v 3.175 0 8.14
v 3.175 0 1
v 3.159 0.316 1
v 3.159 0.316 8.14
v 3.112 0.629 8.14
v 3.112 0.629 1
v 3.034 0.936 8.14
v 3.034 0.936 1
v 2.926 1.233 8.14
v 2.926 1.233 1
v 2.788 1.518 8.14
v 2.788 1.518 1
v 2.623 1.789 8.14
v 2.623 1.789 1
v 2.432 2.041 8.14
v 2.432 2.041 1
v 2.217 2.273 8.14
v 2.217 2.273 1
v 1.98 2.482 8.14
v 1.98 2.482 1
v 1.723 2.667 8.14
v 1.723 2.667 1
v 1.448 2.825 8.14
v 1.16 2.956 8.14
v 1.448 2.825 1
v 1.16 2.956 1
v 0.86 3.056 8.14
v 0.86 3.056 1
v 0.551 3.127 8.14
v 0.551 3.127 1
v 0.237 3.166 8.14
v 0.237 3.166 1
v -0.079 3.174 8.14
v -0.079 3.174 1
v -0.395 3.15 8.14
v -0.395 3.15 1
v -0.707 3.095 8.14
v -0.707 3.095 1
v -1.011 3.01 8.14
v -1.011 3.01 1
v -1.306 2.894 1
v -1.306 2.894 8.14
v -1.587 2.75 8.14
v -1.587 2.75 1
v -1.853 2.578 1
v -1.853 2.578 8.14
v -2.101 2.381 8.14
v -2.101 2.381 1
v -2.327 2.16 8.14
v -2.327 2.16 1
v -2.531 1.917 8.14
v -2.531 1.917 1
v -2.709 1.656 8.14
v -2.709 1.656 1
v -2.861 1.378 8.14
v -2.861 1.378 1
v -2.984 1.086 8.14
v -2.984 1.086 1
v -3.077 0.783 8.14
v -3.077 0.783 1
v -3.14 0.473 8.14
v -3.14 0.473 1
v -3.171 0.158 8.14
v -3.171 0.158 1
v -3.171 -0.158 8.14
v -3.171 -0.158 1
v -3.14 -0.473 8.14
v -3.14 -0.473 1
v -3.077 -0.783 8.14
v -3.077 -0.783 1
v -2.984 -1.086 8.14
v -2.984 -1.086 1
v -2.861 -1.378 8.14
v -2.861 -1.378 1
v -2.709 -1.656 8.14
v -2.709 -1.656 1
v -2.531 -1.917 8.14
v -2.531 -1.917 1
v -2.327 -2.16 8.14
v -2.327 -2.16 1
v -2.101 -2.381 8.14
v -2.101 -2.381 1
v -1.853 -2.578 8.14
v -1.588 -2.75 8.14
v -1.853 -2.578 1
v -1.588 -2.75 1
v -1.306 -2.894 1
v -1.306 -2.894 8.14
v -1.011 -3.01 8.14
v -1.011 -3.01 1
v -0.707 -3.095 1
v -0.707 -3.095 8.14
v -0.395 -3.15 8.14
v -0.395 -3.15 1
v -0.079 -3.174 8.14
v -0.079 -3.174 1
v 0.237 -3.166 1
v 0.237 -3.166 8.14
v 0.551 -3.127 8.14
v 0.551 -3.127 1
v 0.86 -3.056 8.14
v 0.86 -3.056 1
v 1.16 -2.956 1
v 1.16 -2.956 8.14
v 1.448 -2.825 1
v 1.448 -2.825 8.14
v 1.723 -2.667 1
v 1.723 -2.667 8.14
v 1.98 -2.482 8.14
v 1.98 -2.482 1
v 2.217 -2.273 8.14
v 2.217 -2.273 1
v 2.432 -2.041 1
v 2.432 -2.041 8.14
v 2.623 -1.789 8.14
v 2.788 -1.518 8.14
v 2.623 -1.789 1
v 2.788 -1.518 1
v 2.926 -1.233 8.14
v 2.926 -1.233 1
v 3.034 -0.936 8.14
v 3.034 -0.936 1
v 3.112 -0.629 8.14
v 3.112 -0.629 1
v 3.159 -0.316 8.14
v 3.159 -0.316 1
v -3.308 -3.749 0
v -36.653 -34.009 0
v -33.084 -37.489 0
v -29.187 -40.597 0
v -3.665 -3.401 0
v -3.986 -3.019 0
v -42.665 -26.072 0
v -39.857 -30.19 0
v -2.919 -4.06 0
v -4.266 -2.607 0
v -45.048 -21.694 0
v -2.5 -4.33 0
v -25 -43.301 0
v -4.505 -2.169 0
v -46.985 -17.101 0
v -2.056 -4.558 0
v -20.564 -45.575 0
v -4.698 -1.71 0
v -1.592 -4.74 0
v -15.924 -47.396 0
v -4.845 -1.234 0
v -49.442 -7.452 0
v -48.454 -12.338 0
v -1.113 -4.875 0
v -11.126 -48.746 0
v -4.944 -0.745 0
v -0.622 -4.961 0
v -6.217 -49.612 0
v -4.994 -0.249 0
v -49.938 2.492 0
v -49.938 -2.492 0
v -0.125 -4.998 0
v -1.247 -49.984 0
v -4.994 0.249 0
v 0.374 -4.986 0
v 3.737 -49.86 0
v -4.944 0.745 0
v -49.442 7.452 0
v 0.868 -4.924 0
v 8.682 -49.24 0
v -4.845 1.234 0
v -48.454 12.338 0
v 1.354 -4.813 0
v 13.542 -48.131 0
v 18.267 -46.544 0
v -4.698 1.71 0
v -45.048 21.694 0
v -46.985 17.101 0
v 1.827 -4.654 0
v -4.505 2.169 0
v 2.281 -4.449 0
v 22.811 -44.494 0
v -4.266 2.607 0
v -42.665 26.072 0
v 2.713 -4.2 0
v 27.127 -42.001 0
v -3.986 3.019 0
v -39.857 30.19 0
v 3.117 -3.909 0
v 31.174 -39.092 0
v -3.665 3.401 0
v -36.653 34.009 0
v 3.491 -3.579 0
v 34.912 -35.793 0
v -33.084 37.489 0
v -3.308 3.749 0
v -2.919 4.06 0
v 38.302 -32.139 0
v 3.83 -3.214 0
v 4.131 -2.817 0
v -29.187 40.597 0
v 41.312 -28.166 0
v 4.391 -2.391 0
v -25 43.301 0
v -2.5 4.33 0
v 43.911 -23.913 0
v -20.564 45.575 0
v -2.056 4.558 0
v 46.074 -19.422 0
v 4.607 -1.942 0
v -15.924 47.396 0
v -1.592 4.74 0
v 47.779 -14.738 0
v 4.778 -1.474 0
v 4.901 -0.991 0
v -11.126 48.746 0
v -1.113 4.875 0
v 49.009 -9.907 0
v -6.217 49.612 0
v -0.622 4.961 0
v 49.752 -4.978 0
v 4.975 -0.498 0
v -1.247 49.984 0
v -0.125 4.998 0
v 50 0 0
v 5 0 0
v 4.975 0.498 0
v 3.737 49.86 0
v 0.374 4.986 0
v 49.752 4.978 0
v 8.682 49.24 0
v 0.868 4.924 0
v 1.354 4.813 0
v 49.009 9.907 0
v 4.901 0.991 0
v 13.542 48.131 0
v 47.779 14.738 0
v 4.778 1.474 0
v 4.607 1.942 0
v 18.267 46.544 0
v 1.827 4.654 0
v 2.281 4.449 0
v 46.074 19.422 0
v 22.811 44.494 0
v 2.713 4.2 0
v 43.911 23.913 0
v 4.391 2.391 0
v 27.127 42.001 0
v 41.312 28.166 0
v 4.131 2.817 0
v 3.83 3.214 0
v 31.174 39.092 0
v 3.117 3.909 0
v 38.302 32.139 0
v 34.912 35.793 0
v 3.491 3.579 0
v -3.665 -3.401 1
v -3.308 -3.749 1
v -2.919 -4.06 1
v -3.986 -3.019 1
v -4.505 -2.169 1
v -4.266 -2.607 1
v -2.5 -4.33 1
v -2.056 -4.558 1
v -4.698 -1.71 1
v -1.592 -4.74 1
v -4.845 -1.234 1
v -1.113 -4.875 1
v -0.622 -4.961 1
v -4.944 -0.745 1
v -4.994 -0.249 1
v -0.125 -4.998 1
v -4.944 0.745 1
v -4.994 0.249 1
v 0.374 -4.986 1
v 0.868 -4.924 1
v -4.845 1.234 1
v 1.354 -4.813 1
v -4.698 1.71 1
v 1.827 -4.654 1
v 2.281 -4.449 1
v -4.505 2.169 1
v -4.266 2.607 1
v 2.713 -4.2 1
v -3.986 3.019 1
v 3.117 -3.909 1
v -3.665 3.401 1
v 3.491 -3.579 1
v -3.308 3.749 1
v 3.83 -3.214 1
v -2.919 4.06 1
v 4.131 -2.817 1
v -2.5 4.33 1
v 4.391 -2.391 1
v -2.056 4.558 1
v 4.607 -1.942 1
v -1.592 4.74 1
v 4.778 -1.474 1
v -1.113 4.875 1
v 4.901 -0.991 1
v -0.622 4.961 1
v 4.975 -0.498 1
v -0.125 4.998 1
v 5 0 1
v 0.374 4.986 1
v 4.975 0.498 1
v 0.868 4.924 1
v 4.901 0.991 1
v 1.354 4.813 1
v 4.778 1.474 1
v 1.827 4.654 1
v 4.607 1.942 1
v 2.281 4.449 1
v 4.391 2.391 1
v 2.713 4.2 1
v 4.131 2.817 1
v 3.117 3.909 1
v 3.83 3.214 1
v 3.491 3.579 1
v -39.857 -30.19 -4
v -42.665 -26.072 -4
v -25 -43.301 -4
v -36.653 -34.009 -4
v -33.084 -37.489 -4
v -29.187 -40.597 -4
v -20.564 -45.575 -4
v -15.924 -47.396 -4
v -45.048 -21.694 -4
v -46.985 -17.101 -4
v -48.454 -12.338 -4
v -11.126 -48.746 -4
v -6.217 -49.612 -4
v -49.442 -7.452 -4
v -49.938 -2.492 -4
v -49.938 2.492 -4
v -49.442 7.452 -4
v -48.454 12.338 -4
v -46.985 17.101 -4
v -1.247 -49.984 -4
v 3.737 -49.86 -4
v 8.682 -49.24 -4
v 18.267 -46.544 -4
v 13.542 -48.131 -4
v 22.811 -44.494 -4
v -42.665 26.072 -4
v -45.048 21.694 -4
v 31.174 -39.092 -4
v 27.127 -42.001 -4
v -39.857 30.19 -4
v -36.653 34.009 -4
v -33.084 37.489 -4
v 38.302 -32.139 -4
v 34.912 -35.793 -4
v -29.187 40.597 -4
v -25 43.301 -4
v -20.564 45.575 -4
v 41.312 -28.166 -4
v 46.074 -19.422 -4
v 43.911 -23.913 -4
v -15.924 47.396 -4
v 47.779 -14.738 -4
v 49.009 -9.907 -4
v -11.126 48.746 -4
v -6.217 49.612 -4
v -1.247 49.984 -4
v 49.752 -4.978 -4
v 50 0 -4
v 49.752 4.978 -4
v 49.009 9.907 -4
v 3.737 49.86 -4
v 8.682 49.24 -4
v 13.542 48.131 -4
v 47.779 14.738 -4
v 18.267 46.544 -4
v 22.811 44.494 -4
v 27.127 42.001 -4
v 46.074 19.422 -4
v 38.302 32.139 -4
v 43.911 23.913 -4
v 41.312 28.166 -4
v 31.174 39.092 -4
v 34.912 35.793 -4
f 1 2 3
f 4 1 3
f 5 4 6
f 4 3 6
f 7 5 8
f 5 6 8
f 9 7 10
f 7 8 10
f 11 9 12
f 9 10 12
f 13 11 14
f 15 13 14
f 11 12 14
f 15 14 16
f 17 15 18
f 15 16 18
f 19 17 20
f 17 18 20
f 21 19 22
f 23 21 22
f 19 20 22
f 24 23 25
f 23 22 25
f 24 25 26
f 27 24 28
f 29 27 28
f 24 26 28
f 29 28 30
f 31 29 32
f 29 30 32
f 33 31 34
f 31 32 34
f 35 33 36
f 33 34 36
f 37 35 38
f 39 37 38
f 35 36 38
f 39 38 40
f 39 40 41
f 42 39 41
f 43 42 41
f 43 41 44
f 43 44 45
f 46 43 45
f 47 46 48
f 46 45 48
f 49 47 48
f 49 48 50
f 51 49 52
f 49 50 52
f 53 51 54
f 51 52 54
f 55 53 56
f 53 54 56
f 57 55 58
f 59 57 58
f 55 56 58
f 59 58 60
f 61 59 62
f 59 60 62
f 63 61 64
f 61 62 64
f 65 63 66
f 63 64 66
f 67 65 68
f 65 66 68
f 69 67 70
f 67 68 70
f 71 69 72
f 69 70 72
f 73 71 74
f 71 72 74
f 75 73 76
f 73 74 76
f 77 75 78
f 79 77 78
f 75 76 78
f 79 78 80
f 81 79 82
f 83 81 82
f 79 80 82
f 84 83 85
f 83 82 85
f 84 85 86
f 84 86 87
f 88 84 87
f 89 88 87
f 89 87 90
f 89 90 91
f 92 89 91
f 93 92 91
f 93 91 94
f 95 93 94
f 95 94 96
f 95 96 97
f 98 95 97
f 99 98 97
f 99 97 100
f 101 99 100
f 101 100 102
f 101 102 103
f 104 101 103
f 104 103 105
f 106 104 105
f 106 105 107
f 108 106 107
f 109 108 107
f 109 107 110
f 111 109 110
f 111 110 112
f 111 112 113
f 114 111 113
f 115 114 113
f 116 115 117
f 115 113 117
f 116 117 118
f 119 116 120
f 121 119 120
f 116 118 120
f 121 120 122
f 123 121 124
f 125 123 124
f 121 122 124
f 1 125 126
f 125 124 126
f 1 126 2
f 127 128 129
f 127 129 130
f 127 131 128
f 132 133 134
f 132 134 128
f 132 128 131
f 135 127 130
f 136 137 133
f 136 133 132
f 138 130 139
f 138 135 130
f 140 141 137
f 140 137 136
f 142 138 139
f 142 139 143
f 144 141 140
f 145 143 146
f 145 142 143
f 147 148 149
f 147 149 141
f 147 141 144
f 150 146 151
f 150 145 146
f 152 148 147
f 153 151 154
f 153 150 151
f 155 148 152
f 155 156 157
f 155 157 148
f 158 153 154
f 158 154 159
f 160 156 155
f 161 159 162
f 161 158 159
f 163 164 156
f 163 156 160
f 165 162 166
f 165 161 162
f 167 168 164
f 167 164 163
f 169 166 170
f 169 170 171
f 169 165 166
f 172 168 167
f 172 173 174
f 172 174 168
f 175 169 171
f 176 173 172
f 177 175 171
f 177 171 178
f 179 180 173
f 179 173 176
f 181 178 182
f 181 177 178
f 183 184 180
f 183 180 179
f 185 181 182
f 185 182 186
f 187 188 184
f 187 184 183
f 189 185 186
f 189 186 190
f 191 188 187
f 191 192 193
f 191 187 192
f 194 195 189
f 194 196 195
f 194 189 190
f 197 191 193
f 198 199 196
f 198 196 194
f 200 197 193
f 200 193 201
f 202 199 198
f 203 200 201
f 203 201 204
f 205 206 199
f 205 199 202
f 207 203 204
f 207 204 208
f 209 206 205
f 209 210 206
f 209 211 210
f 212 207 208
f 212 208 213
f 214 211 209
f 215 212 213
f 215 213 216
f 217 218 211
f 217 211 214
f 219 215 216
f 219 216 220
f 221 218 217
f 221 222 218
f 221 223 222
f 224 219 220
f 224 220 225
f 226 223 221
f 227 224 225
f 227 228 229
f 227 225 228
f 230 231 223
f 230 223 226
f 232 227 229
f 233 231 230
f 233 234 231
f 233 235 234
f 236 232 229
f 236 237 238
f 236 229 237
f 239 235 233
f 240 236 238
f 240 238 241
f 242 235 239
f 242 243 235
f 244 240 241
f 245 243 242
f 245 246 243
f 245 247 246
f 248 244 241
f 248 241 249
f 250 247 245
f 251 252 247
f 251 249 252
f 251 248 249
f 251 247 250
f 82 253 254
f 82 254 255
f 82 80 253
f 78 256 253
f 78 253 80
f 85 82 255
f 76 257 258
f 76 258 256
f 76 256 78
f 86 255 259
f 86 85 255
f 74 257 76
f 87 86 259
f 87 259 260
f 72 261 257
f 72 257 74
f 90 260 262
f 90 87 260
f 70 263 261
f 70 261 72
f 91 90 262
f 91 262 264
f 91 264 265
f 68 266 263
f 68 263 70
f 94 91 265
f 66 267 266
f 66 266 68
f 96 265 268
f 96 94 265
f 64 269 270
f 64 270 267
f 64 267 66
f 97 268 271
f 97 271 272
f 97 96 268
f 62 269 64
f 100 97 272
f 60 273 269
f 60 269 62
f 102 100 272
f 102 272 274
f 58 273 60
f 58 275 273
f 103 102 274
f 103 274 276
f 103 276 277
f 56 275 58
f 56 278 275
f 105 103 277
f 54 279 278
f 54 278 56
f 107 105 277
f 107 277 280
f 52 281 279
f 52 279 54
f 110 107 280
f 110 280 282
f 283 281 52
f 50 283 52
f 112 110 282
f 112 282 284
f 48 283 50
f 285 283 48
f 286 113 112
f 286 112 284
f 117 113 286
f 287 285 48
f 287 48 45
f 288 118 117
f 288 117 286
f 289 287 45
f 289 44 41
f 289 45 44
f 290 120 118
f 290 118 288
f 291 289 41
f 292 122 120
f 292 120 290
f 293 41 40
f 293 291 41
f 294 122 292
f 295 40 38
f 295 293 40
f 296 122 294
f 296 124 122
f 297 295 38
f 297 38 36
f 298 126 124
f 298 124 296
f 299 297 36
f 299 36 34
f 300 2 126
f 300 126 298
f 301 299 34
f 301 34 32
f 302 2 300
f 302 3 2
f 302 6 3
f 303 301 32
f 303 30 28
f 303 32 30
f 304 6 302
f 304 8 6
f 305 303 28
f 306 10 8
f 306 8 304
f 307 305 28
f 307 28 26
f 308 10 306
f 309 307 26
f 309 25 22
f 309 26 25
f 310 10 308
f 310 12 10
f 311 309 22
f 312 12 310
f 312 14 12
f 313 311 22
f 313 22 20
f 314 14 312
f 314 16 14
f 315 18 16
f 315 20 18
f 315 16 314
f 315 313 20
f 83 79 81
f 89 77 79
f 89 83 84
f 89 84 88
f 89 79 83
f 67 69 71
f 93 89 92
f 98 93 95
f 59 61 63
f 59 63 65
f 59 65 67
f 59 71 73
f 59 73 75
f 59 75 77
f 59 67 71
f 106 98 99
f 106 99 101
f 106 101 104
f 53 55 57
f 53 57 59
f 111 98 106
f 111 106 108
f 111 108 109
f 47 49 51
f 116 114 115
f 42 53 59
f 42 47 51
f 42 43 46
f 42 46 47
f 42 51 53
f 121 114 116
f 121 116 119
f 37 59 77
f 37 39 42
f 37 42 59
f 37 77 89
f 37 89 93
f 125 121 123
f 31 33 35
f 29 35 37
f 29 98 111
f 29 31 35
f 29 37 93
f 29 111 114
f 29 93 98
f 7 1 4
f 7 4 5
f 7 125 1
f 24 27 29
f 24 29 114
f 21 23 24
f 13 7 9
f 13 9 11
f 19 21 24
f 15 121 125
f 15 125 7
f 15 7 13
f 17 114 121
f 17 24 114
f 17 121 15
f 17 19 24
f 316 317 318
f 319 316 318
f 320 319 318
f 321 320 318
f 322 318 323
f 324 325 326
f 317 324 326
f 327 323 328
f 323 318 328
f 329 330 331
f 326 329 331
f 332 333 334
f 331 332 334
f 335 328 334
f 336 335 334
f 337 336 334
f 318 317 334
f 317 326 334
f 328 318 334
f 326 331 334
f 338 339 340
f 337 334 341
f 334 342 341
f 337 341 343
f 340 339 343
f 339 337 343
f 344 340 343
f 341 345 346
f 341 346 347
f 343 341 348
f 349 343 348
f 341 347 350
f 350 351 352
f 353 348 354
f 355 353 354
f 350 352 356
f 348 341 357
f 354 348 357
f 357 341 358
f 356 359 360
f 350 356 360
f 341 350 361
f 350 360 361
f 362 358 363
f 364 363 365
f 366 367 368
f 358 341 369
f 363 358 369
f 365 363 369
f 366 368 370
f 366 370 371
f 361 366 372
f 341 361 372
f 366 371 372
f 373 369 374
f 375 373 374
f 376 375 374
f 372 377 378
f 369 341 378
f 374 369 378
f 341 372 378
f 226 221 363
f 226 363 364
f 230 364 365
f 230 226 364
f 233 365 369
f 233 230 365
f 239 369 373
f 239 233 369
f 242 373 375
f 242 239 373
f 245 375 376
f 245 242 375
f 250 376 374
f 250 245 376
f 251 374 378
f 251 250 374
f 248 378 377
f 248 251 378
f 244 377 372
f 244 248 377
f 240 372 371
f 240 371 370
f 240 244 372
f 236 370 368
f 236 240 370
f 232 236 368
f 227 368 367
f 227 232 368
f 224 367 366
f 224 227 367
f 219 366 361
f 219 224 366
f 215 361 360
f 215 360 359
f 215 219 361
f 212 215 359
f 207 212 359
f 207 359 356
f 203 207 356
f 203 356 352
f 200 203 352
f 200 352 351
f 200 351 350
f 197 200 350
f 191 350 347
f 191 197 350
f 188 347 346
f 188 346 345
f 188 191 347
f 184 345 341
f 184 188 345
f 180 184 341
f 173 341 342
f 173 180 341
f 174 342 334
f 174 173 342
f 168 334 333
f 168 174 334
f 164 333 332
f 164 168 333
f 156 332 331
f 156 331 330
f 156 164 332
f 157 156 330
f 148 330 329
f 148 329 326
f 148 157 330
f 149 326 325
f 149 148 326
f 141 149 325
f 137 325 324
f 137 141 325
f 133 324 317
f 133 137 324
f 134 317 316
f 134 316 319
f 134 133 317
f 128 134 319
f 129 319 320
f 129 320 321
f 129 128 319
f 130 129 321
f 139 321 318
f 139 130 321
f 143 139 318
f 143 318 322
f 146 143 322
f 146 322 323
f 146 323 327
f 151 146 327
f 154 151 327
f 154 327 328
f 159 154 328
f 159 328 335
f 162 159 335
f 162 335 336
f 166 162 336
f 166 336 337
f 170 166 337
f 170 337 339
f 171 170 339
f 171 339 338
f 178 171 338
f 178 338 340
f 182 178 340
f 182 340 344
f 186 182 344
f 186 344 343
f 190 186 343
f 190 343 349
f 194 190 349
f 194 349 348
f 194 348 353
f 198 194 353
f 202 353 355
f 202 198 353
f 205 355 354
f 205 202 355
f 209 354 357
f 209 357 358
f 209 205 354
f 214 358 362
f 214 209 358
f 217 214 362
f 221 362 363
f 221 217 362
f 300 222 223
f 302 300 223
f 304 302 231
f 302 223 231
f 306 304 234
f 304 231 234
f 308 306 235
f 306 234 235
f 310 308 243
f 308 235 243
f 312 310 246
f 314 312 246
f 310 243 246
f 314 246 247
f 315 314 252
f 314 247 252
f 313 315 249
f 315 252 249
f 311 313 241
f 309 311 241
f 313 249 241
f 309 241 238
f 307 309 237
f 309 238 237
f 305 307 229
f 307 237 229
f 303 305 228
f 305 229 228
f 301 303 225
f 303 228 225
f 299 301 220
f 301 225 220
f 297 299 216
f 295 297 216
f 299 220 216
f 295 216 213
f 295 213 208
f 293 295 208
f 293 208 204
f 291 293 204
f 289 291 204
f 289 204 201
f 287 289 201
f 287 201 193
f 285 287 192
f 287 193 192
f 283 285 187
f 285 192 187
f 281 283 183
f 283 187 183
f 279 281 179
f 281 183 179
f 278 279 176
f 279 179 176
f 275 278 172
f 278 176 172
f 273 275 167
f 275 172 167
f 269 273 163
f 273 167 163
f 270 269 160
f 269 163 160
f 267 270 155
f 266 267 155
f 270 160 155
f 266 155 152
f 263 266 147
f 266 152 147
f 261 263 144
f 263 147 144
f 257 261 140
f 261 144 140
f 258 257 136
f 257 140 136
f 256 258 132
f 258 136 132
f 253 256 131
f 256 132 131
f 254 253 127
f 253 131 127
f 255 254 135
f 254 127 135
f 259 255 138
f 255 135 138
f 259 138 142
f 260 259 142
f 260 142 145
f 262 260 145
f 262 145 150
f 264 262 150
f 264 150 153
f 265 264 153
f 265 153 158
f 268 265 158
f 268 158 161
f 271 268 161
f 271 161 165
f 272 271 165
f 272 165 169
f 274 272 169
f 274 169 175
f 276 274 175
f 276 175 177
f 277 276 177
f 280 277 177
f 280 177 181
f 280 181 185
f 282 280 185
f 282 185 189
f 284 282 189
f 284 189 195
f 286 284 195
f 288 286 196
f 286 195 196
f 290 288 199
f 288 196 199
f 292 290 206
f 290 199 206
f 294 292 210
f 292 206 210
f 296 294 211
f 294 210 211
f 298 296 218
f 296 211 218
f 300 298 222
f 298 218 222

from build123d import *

# Parameters (mm, degrees)
F0_R       = 5
F0_R_2     = 3.175
F1_DEPTH   = 1
F2_R       = 3.175
F3_DEPTH   = 7.14
F0_R_3     = 50
F1_FACE1_R = 5
F4_DEPTH   = 4


with BuildPart() as f1:
    # F0 (on Top) → F1 (new body)
    with BuildSketch(Plane.XY):
        Circle(F0_R)
        Circle(F0_R_2, mode=Mode.SUBTRACT)
        Circle(F0_R_2)
    extrude(amount=F1_DEPTH)

    # F2 (on face) → F3 (join)
    with BuildSketch(Plane.XY.offset(1)):
        Circle(F2_R)
    extrude(amount=F3_DEPTH)

    # F0 (on Top) + F1_face1 (on face) → F4 (join)
    with BuildSketch(Plane.XY):
        Circle(F0_R_3)
        Circle(F0_R, mode=Mode.SUBTRACT)
    with BuildSketch(Plane(origin=(0, 0, 0), x_dir=(1, 0, 0), z_dir=(0, 0, -1))):
        Circle(F1_FACE1_R)
    extrude(amount=-F4_DEPTH, dir=(0, 0, 1))


solid = f1.part
